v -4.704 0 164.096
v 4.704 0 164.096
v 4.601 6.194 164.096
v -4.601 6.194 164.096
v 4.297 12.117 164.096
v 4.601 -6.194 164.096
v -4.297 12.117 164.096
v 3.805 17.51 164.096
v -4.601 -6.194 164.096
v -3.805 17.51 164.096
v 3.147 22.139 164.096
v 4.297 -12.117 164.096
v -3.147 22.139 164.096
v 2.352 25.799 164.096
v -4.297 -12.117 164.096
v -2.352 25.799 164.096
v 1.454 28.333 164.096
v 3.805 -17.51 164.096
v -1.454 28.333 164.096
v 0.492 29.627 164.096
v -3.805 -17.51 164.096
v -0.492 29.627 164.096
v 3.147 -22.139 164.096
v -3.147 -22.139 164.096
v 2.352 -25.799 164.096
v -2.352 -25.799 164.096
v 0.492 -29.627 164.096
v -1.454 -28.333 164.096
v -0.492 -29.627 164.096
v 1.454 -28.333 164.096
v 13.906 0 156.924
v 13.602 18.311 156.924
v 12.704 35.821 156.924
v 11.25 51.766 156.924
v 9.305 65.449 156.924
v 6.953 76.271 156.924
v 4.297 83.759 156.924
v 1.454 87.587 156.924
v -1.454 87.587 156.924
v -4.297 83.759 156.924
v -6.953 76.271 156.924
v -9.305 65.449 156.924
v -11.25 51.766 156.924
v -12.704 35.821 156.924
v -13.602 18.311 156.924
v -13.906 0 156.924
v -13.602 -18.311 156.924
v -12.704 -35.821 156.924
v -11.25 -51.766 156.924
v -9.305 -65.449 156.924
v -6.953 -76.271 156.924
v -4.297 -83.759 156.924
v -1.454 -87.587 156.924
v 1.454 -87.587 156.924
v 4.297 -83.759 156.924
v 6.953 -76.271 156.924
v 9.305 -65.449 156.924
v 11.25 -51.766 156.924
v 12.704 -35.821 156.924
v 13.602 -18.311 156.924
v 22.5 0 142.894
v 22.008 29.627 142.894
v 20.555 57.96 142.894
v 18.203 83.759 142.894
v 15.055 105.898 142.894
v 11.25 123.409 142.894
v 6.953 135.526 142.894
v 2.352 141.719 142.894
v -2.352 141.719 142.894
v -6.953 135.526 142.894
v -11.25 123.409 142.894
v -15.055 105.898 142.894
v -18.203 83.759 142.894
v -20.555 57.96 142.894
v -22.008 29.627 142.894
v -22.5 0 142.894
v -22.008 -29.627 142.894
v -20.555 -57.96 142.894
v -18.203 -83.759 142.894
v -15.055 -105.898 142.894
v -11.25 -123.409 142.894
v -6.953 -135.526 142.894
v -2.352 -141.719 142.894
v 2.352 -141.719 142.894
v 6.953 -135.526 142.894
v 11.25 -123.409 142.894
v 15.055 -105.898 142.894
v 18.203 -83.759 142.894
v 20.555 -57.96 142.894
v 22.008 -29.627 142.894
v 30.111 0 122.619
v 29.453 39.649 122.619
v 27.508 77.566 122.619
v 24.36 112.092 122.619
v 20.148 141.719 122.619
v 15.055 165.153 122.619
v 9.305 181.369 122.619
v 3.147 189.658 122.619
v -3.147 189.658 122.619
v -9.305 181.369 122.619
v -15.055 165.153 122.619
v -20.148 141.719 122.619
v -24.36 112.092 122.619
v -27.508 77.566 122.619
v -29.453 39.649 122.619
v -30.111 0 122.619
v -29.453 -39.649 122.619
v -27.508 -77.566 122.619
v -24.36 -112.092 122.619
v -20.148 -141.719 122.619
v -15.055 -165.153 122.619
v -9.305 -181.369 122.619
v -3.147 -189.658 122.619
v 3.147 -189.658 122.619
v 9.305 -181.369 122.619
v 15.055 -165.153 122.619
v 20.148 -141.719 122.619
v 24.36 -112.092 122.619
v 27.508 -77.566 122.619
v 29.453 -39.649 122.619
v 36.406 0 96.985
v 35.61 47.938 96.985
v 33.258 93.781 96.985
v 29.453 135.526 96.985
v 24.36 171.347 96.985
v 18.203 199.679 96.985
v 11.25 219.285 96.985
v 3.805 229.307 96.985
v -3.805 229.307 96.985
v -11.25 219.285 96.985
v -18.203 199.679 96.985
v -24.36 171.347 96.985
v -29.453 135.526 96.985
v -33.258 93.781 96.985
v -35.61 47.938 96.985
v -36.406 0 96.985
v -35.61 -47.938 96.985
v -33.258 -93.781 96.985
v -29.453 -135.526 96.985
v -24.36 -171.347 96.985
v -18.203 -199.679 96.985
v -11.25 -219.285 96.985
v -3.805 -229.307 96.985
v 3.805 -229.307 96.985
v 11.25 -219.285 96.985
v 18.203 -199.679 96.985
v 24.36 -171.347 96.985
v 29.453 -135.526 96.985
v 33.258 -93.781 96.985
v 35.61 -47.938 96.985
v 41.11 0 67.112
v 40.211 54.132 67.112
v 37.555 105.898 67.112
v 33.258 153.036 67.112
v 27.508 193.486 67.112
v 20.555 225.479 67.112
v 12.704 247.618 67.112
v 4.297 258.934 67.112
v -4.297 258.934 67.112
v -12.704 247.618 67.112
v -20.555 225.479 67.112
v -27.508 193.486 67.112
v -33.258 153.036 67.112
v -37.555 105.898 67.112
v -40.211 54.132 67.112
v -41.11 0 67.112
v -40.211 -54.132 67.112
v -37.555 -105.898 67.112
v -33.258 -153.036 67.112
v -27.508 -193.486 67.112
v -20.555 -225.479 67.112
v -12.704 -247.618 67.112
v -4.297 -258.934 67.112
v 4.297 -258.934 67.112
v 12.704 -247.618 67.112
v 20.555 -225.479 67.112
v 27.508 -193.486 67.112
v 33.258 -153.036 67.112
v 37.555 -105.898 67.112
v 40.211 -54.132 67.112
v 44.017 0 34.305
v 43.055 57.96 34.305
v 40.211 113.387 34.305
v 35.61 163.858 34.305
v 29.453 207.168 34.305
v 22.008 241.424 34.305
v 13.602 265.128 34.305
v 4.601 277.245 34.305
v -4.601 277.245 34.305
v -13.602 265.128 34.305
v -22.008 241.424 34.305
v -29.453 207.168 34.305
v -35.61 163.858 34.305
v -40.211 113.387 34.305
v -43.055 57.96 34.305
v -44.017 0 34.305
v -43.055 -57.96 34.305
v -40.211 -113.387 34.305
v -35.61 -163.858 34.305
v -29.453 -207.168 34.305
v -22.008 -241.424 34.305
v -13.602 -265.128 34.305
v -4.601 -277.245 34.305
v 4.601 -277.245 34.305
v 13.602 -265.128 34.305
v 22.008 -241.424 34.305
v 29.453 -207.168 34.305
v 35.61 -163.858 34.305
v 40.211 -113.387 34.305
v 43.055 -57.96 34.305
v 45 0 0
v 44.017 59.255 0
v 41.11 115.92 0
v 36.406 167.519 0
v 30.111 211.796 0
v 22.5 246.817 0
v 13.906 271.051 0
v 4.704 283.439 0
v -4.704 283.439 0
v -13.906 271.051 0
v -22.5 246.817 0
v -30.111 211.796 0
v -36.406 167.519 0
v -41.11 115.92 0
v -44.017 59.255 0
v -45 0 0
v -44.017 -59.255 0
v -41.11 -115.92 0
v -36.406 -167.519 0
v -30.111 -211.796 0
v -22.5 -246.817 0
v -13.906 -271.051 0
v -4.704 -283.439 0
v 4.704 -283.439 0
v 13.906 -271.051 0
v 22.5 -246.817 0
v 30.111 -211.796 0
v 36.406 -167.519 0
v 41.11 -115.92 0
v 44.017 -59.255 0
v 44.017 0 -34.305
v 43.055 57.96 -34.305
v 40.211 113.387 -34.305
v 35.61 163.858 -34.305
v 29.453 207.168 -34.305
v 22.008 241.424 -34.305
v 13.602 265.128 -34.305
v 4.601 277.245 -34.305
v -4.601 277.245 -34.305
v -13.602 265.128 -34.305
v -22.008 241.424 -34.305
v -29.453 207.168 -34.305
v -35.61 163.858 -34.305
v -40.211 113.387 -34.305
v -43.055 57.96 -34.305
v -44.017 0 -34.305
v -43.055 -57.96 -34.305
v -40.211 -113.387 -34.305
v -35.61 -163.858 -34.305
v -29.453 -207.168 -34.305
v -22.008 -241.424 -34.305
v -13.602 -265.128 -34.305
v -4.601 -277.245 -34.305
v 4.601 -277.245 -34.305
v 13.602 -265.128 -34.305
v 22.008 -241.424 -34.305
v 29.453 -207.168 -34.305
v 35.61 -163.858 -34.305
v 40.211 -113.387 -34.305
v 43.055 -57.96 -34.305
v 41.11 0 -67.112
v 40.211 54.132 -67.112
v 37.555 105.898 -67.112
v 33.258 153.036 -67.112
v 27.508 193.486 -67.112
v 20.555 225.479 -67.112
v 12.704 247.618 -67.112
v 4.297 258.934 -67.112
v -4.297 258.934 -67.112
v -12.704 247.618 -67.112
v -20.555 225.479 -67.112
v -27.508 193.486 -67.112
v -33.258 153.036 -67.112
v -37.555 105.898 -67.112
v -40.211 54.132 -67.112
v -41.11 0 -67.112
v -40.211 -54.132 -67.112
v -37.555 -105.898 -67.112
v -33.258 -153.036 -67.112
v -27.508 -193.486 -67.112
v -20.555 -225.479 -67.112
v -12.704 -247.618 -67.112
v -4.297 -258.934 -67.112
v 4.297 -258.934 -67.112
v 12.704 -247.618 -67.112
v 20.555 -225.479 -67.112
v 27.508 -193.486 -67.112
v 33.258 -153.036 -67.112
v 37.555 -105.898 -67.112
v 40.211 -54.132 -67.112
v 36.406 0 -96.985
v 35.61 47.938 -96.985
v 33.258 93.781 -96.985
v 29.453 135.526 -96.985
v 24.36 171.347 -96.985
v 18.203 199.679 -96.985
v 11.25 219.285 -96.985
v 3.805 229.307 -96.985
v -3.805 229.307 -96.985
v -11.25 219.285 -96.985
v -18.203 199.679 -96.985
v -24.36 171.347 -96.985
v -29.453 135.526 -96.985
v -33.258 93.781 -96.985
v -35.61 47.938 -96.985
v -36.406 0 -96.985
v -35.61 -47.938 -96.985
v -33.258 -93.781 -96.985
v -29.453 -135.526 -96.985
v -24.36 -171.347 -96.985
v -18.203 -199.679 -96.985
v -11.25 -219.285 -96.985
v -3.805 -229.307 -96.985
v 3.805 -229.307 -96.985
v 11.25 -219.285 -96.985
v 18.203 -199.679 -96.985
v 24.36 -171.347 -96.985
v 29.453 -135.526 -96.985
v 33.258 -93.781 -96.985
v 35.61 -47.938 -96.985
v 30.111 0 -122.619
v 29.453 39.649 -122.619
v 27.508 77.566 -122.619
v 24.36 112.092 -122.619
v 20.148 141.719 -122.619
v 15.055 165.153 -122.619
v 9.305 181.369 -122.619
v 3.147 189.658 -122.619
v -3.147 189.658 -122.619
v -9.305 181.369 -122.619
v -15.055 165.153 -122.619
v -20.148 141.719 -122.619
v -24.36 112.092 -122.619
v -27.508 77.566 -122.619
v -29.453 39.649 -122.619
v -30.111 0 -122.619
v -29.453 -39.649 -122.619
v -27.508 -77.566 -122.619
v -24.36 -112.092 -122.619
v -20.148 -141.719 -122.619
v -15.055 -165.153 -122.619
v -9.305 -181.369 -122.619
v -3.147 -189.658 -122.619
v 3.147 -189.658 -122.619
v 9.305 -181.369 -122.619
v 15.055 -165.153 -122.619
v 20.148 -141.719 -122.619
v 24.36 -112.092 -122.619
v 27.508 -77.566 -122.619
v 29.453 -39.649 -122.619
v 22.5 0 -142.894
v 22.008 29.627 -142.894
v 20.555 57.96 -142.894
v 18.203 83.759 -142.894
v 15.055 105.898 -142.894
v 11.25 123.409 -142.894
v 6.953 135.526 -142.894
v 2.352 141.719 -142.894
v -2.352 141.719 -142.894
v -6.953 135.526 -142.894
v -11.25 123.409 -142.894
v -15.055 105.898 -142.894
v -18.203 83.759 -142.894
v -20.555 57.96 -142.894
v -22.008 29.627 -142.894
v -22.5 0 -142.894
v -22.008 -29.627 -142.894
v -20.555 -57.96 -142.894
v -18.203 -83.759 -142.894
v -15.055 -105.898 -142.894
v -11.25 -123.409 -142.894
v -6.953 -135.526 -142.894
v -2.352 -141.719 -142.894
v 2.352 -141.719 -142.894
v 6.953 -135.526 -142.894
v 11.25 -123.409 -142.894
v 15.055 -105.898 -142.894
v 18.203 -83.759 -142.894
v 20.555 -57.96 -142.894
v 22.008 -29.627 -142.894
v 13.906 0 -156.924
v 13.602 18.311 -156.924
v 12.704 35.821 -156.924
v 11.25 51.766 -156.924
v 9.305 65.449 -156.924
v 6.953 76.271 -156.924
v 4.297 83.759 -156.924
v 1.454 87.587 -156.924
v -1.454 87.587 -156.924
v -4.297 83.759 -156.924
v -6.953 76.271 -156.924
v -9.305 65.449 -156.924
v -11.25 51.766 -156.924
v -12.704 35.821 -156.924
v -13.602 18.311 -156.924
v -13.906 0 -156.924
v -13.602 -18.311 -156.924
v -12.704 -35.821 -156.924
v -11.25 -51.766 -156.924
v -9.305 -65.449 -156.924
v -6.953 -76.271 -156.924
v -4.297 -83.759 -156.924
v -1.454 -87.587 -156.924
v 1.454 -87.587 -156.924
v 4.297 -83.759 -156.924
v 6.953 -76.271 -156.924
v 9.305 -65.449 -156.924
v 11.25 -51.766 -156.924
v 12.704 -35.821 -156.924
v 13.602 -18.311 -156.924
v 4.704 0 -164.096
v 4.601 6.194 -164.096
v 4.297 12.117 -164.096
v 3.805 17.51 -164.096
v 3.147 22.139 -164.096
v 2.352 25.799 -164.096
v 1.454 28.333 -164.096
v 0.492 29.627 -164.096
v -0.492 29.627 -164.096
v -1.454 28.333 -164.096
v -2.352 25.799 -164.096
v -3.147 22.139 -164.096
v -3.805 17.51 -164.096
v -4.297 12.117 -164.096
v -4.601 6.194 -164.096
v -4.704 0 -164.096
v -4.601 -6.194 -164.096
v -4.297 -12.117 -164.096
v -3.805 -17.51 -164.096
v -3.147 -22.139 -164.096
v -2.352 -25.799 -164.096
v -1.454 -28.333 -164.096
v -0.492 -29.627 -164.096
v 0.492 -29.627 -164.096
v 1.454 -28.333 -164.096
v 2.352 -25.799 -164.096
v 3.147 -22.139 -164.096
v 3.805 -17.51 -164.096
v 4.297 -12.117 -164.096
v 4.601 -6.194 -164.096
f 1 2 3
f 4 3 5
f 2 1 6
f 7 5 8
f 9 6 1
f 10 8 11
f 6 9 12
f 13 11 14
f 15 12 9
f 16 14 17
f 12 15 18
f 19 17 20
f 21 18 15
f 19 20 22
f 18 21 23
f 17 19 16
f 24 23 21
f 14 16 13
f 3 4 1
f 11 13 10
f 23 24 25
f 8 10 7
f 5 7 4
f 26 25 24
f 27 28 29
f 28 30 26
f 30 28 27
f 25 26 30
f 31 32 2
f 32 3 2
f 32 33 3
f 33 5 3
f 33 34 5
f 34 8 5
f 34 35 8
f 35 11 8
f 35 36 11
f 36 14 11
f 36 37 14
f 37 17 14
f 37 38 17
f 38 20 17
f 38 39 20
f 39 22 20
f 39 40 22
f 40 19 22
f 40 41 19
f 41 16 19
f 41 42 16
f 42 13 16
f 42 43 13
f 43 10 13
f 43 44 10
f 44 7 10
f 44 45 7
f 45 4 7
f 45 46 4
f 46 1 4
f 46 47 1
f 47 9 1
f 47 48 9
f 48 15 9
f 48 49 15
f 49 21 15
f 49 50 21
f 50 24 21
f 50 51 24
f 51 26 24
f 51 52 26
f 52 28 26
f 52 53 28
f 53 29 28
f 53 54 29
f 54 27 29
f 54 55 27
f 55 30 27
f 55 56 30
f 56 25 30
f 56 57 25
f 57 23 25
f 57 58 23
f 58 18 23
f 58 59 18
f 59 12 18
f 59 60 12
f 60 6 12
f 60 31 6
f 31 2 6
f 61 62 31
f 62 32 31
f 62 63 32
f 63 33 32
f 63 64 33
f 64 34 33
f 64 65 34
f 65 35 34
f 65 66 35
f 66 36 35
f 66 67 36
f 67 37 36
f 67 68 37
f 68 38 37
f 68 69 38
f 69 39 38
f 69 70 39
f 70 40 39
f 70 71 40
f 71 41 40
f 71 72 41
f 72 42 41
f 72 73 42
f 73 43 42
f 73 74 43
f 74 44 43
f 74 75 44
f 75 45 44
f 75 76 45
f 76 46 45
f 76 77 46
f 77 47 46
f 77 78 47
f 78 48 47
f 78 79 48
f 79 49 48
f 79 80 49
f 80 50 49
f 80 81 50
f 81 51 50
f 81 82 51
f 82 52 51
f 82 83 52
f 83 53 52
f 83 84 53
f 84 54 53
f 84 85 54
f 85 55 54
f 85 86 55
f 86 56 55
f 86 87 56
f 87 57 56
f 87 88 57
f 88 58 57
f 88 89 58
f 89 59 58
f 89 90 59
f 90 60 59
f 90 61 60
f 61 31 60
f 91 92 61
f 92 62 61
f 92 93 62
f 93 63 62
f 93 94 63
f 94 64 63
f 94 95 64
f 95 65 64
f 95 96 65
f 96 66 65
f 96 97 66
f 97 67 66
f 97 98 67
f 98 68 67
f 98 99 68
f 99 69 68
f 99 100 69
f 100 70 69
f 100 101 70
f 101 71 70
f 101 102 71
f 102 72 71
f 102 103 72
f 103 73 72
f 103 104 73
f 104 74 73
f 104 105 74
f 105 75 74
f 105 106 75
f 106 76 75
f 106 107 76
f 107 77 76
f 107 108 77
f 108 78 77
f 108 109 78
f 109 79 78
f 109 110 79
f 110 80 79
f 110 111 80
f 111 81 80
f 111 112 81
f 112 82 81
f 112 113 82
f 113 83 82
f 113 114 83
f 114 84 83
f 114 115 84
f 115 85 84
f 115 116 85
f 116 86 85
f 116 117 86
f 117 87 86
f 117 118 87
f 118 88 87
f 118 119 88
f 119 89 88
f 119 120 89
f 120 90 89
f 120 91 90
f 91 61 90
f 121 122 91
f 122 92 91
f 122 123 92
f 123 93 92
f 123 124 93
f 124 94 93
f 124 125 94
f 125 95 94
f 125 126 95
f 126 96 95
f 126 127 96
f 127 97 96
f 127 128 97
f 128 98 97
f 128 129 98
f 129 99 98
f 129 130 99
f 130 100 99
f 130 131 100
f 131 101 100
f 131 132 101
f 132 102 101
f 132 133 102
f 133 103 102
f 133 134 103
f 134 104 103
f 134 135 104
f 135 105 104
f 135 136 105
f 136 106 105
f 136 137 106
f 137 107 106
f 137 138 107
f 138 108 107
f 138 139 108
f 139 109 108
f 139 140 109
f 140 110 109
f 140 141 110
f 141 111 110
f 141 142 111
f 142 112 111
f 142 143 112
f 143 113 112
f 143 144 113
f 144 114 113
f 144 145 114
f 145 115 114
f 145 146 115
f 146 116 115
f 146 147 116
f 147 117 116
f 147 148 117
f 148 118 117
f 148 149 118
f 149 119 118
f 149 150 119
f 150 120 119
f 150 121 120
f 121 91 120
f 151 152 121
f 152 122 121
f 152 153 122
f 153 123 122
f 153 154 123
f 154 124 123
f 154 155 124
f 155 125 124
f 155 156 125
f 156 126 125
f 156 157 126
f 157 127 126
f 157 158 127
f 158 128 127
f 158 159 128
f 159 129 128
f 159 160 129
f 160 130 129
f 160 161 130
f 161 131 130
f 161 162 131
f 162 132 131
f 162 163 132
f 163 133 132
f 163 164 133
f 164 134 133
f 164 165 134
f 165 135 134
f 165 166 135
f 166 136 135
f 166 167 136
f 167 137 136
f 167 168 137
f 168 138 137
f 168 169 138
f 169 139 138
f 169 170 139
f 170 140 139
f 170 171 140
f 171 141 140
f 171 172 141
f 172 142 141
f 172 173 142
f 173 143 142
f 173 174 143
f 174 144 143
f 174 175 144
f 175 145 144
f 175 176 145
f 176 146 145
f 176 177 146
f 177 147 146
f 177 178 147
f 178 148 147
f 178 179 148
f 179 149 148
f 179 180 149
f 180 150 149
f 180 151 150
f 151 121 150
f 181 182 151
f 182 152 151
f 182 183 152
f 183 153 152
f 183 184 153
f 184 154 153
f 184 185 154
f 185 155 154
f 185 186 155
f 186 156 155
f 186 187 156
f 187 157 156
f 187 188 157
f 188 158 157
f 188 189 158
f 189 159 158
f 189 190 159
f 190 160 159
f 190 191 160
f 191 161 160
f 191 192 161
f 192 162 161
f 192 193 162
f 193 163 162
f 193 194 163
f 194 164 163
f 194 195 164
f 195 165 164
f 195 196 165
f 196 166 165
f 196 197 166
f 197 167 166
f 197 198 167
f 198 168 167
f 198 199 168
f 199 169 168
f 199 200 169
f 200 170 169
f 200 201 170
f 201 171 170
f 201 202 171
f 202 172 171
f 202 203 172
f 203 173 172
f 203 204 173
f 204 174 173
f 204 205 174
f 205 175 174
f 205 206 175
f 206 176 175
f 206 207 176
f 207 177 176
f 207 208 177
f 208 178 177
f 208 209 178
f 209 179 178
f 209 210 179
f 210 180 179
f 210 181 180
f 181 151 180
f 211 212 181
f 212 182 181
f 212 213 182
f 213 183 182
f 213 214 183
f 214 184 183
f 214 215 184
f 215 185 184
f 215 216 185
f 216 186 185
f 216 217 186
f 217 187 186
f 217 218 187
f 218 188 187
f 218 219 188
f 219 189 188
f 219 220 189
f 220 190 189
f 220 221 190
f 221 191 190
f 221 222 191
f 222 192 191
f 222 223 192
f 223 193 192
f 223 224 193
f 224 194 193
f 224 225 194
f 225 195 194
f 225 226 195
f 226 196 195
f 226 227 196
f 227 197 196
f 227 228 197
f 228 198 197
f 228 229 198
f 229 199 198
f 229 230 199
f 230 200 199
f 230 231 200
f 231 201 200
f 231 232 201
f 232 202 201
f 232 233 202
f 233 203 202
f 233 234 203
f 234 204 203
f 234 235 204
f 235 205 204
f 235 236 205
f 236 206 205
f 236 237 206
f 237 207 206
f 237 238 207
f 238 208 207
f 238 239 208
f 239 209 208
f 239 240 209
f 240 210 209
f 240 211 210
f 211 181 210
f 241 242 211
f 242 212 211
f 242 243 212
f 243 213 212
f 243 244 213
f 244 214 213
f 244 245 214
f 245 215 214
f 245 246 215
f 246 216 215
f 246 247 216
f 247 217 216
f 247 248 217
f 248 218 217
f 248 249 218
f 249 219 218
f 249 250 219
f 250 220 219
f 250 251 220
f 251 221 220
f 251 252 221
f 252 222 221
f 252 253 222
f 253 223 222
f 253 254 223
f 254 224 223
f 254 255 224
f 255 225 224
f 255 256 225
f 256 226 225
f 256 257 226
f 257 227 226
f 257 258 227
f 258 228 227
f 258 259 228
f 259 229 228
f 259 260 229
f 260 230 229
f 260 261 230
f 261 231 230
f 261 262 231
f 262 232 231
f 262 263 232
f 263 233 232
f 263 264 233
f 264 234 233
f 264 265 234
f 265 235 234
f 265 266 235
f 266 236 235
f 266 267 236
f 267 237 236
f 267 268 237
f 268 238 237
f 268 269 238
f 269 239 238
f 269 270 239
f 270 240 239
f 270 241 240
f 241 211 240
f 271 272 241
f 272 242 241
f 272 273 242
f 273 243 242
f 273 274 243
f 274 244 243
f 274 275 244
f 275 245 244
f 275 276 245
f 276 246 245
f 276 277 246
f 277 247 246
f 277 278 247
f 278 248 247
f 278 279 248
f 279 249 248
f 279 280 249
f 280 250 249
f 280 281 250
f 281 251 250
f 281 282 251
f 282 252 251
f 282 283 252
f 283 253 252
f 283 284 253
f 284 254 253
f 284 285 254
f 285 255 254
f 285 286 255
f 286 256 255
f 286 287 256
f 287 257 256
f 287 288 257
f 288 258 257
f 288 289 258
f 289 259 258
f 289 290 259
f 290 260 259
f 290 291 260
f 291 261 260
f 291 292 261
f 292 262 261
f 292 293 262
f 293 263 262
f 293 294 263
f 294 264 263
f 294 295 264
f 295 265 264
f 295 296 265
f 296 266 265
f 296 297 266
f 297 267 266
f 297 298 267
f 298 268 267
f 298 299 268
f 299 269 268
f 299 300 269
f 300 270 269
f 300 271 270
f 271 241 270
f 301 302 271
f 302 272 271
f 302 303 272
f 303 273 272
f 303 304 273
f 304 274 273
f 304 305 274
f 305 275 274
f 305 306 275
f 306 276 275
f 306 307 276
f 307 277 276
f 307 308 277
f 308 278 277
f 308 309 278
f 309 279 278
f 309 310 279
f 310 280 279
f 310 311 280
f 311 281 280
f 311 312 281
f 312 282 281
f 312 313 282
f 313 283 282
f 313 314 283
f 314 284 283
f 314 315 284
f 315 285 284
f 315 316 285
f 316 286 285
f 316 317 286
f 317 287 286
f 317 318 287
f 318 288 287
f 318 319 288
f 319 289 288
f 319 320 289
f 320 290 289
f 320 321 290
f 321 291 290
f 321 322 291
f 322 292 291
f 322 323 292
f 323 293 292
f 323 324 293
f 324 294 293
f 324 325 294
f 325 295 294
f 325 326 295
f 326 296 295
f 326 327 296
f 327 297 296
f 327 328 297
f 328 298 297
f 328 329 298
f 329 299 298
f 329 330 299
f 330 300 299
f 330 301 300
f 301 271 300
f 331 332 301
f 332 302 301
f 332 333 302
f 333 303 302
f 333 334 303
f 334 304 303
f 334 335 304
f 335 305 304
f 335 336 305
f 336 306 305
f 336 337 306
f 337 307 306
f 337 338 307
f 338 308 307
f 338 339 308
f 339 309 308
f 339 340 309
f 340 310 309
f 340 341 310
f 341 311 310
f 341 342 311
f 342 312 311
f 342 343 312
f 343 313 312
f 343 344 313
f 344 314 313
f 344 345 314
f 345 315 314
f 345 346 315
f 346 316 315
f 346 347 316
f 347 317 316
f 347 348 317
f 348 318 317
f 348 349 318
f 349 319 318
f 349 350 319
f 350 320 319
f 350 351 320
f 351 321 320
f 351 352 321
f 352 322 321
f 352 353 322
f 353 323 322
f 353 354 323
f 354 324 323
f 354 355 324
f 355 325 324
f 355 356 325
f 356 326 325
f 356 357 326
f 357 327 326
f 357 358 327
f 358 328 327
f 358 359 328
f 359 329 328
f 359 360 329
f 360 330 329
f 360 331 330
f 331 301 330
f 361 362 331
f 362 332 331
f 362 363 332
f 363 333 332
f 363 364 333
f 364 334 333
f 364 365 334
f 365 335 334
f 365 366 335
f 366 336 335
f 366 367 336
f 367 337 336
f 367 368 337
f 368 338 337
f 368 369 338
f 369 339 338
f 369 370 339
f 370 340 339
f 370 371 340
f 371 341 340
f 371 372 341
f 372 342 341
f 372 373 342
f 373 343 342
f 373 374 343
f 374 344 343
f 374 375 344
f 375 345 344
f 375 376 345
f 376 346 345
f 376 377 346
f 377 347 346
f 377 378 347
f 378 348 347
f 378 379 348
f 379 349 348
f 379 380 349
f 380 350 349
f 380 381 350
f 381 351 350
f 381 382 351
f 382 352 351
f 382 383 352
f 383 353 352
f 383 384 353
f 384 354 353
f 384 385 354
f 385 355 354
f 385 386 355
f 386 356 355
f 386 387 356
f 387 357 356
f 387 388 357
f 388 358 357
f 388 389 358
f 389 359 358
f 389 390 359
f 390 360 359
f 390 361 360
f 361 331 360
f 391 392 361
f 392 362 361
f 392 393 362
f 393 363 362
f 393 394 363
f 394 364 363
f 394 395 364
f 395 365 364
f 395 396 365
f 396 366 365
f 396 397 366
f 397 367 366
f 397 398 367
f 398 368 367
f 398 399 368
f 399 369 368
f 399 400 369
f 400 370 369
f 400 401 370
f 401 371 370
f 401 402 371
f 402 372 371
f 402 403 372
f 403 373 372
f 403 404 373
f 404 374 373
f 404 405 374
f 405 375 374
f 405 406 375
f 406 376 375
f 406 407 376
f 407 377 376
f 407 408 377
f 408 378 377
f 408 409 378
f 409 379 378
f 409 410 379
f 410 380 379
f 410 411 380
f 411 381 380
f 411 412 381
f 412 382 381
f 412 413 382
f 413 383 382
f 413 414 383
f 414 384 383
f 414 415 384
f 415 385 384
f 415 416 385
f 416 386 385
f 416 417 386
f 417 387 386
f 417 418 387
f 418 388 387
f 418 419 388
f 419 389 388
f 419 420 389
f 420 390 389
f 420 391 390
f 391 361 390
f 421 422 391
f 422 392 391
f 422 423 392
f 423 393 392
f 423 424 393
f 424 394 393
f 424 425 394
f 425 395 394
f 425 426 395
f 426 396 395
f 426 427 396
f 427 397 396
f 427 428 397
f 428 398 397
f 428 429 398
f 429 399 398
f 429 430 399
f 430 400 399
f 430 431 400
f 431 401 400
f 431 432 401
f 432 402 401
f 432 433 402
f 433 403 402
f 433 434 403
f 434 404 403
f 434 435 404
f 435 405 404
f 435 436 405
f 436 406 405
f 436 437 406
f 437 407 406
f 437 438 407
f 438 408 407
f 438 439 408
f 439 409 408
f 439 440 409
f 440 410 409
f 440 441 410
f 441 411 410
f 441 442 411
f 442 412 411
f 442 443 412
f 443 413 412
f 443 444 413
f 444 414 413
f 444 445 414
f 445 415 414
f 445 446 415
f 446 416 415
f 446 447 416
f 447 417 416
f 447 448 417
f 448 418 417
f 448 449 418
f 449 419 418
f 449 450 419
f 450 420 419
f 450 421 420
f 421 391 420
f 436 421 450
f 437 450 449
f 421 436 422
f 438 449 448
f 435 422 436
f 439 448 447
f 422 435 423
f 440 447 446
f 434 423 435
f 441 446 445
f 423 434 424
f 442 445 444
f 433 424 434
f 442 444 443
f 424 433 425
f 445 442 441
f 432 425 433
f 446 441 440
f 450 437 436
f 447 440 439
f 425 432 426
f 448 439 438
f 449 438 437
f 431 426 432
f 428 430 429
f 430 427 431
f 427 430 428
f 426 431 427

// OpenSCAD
// Generated by SolidPython 1.0.1 on 2020-07-29 00:46:46


scale(v = [3, 19, 11]) {
	sphere(r = 15);
}
/***********************************************
*********      SolidPython code:      **********
************************************************
 
# import packages: SolidPython
from solid import *
from solid.utils import *
from itertools import chain, combinations, permutations


class Resize:

    def __init__(self, scad_file):
        self.scad_file = scad_file
        #self.scad_file = import_scad(scad_file)
        # cone/cylinder param:
        self.r1 = 0
        self.r2 = 0
        self.h = 0
        # rectangular prism param:
        self.w = 0
        self.l = 0
        # ellipse param:
        self.r = 0

    # import OpenScad code (file name corresponds to shape)


    # classify shape + parameters
    def assign(self, param1, param2, param3):
        if self.scad_file == 'cone.scad':
            self.r1 = param1
            self.r2 = param2
            self.h = param3
        elif self.scad_file == 'cylinder.scad':
            self.r1 = param1
            self.r2 = param2
            self.h = param3
        elif self.scad_file == 'rectangularPrism.scad':
            self.h = param1
            self.l = param2
            self.w = param3
        else:
            self.r = param1
            self.h = param2

    # resize parameters
    def iterate(self):
        x = range(3, 20, 2)
        i = 1
        if self.scad_file == 'cone.scad':
            tempList = list(permutations(x, 2))
            for temp in tempList:
                param1 = temp[0]
                param2 = temp[1]
                filepath = 'produced_scad_files/' + 'cone' + str(param1) + '_' + str(param2) + '_' + '.scad'
                scad_render_to_file(cylinder(h=param1, r1=param2, r2=0), filepath)

        elif self.scad_file == 'cylinder.scad':
            tempList = list(permutations(x, 3))
            for temp in tempList:
                param1 = temp[0]
                param2 = temp[1]
                filepath = 'produced_scad_files/' + 'cylinder' + str(param1) + '_' + str(param2) + '_' + '.scad'
                scad_render_to_file(cylinder(h=param1, r1=param2, r2=param2), filepath)

        elif self.scad_file == 'rectangularPrism.scad':
            tempList = list(permutations(x, 3))
            for temp in tempList:
                param1 = temp[0]
                param2 = temp[1]
                param3 = temp[2]
                filepath = 'produced_scad_files/' + 'rectangularPrism' + str(param1) + '_' + str(param2) + '_' + str(
                    param3) + '.scad'
                scad_render_to_file(cube(size=(param1, param2, param3)), filepath)

        elif self.scad_file == 'ellipse.scad':
            tempList = list(permutations(x, 4))
            for temp in tempList:
                param1 = temp[0]
                param2 = temp[1]
                param3 = temp[2]
                param4 = temp[3]
                filepath = 'produced_scad_files/' + 'ellipse' + str(param1) + '_' + str(param2) + '_' + str(param3) + '_' + str(param4) + '.scad'
                scad_render_to_file(scale([param1, param2, param3])(sphere(r=param4)), filepath)

    def render_to_scadfile(self):
        scad_render_to_file(scad, 'example.scad') 
 
************************************************/
